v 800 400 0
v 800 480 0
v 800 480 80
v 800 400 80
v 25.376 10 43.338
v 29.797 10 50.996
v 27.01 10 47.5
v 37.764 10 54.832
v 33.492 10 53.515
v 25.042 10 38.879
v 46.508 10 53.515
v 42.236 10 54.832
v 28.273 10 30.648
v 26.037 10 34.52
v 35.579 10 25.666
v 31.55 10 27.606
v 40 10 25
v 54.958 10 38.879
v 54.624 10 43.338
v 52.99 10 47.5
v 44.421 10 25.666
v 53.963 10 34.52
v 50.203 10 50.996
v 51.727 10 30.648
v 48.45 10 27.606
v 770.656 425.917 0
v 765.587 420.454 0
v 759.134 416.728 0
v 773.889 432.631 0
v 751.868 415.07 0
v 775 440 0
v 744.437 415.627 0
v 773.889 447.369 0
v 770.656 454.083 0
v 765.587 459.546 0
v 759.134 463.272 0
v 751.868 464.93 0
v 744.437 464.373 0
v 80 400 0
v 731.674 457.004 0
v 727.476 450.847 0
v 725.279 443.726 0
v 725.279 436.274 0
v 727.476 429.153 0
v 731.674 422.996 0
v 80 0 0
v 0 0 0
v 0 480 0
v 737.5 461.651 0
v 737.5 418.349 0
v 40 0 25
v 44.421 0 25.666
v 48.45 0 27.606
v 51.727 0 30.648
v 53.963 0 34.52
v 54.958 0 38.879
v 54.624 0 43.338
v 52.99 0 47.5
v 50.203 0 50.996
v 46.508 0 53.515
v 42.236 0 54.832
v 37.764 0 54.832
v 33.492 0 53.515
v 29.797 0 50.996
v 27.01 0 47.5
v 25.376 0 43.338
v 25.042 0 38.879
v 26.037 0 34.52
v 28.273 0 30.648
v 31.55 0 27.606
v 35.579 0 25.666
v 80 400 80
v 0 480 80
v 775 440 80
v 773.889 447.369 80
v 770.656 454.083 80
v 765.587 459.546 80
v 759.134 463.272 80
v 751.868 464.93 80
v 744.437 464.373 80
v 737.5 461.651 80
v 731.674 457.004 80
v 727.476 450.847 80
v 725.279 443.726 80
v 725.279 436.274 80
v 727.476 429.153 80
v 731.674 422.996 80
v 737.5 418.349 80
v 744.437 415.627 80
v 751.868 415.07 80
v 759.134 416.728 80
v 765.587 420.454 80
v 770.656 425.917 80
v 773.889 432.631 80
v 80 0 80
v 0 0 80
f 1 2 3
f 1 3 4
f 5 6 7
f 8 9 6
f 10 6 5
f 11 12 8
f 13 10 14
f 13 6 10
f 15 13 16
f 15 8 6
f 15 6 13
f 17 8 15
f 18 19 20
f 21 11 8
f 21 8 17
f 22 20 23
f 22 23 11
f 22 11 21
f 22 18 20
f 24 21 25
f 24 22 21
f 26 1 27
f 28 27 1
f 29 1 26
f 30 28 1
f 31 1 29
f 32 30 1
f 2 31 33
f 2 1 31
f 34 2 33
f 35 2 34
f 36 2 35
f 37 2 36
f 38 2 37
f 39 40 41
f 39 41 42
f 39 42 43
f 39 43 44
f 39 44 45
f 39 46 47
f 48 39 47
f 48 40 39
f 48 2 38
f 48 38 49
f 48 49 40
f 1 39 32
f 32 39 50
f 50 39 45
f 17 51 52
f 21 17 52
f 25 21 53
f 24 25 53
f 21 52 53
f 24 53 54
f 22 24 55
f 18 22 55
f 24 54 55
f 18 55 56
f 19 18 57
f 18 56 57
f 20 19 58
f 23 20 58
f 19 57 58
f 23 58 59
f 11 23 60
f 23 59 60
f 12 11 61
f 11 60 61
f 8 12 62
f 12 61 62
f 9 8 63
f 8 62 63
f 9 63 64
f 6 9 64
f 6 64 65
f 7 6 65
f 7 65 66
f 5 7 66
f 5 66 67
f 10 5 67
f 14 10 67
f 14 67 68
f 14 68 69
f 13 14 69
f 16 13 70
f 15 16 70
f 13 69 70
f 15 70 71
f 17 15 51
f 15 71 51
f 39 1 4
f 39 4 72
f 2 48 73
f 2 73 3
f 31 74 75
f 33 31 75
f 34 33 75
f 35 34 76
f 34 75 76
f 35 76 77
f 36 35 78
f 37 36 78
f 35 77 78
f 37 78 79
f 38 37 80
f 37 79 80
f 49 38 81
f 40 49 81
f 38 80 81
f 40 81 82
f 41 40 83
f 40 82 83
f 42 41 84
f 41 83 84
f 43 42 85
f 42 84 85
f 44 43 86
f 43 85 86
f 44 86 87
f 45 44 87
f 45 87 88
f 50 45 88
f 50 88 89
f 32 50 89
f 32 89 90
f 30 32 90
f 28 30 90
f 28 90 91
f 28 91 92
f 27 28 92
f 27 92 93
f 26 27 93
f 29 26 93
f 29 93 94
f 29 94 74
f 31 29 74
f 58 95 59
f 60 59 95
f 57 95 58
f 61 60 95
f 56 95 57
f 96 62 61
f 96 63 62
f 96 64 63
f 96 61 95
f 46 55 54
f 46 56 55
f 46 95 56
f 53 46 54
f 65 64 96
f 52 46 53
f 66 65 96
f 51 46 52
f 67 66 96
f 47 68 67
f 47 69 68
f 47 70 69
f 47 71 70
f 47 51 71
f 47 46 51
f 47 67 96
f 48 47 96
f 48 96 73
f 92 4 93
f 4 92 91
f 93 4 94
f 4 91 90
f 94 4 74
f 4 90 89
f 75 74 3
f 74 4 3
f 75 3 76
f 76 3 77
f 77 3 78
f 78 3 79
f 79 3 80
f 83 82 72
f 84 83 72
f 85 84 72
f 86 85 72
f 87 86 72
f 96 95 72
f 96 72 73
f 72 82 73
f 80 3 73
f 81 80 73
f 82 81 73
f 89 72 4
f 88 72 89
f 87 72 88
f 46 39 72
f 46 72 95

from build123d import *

# Parameters (mm, degrees)
BOSS_EXTRUDE1_DEPTH = 80
SKETCH2_R           = 25
CUT_EXTRUDE1_DEPTH  = 161
SKETCH3_R           = 15
CUT_EXTRUDE2_DEPTH  = 10


with BuildPart() as part:
    # Sketch1 → Boss-Extrude1 (new body)
    with BuildSketch(Plane.XY):
        Polygon((0, 0), (0, 480), (800, 480), (800, 400), (80, 400), (80, 0), align=None)
    extrude(amount=BOSS_EXTRUDE1_DEPTH)

    # Sketch2 → Cut-Extrude1 (cut)
    with BuildSketch(Plane.XY.offset(80)):
        with Locations((750, 440)):
            Circle(SKETCH2_R)
    extrude(amount=-CUT_EXTRUDE1_DEPTH, mode=Mode.SUBTRACT)

    # Sketch3 → Cut-Extrude2 (cut)
    with BuildSketch(Plane.XZ):
        with Locations(Location((40, 40, 0), (0, 0, 270))):
            Circle(SKETCH3_R)
    extrude(amount=-CUT_EXTRUDE2_DEPTH, mode=Mode.SUBTRACT)


solid = part.part
